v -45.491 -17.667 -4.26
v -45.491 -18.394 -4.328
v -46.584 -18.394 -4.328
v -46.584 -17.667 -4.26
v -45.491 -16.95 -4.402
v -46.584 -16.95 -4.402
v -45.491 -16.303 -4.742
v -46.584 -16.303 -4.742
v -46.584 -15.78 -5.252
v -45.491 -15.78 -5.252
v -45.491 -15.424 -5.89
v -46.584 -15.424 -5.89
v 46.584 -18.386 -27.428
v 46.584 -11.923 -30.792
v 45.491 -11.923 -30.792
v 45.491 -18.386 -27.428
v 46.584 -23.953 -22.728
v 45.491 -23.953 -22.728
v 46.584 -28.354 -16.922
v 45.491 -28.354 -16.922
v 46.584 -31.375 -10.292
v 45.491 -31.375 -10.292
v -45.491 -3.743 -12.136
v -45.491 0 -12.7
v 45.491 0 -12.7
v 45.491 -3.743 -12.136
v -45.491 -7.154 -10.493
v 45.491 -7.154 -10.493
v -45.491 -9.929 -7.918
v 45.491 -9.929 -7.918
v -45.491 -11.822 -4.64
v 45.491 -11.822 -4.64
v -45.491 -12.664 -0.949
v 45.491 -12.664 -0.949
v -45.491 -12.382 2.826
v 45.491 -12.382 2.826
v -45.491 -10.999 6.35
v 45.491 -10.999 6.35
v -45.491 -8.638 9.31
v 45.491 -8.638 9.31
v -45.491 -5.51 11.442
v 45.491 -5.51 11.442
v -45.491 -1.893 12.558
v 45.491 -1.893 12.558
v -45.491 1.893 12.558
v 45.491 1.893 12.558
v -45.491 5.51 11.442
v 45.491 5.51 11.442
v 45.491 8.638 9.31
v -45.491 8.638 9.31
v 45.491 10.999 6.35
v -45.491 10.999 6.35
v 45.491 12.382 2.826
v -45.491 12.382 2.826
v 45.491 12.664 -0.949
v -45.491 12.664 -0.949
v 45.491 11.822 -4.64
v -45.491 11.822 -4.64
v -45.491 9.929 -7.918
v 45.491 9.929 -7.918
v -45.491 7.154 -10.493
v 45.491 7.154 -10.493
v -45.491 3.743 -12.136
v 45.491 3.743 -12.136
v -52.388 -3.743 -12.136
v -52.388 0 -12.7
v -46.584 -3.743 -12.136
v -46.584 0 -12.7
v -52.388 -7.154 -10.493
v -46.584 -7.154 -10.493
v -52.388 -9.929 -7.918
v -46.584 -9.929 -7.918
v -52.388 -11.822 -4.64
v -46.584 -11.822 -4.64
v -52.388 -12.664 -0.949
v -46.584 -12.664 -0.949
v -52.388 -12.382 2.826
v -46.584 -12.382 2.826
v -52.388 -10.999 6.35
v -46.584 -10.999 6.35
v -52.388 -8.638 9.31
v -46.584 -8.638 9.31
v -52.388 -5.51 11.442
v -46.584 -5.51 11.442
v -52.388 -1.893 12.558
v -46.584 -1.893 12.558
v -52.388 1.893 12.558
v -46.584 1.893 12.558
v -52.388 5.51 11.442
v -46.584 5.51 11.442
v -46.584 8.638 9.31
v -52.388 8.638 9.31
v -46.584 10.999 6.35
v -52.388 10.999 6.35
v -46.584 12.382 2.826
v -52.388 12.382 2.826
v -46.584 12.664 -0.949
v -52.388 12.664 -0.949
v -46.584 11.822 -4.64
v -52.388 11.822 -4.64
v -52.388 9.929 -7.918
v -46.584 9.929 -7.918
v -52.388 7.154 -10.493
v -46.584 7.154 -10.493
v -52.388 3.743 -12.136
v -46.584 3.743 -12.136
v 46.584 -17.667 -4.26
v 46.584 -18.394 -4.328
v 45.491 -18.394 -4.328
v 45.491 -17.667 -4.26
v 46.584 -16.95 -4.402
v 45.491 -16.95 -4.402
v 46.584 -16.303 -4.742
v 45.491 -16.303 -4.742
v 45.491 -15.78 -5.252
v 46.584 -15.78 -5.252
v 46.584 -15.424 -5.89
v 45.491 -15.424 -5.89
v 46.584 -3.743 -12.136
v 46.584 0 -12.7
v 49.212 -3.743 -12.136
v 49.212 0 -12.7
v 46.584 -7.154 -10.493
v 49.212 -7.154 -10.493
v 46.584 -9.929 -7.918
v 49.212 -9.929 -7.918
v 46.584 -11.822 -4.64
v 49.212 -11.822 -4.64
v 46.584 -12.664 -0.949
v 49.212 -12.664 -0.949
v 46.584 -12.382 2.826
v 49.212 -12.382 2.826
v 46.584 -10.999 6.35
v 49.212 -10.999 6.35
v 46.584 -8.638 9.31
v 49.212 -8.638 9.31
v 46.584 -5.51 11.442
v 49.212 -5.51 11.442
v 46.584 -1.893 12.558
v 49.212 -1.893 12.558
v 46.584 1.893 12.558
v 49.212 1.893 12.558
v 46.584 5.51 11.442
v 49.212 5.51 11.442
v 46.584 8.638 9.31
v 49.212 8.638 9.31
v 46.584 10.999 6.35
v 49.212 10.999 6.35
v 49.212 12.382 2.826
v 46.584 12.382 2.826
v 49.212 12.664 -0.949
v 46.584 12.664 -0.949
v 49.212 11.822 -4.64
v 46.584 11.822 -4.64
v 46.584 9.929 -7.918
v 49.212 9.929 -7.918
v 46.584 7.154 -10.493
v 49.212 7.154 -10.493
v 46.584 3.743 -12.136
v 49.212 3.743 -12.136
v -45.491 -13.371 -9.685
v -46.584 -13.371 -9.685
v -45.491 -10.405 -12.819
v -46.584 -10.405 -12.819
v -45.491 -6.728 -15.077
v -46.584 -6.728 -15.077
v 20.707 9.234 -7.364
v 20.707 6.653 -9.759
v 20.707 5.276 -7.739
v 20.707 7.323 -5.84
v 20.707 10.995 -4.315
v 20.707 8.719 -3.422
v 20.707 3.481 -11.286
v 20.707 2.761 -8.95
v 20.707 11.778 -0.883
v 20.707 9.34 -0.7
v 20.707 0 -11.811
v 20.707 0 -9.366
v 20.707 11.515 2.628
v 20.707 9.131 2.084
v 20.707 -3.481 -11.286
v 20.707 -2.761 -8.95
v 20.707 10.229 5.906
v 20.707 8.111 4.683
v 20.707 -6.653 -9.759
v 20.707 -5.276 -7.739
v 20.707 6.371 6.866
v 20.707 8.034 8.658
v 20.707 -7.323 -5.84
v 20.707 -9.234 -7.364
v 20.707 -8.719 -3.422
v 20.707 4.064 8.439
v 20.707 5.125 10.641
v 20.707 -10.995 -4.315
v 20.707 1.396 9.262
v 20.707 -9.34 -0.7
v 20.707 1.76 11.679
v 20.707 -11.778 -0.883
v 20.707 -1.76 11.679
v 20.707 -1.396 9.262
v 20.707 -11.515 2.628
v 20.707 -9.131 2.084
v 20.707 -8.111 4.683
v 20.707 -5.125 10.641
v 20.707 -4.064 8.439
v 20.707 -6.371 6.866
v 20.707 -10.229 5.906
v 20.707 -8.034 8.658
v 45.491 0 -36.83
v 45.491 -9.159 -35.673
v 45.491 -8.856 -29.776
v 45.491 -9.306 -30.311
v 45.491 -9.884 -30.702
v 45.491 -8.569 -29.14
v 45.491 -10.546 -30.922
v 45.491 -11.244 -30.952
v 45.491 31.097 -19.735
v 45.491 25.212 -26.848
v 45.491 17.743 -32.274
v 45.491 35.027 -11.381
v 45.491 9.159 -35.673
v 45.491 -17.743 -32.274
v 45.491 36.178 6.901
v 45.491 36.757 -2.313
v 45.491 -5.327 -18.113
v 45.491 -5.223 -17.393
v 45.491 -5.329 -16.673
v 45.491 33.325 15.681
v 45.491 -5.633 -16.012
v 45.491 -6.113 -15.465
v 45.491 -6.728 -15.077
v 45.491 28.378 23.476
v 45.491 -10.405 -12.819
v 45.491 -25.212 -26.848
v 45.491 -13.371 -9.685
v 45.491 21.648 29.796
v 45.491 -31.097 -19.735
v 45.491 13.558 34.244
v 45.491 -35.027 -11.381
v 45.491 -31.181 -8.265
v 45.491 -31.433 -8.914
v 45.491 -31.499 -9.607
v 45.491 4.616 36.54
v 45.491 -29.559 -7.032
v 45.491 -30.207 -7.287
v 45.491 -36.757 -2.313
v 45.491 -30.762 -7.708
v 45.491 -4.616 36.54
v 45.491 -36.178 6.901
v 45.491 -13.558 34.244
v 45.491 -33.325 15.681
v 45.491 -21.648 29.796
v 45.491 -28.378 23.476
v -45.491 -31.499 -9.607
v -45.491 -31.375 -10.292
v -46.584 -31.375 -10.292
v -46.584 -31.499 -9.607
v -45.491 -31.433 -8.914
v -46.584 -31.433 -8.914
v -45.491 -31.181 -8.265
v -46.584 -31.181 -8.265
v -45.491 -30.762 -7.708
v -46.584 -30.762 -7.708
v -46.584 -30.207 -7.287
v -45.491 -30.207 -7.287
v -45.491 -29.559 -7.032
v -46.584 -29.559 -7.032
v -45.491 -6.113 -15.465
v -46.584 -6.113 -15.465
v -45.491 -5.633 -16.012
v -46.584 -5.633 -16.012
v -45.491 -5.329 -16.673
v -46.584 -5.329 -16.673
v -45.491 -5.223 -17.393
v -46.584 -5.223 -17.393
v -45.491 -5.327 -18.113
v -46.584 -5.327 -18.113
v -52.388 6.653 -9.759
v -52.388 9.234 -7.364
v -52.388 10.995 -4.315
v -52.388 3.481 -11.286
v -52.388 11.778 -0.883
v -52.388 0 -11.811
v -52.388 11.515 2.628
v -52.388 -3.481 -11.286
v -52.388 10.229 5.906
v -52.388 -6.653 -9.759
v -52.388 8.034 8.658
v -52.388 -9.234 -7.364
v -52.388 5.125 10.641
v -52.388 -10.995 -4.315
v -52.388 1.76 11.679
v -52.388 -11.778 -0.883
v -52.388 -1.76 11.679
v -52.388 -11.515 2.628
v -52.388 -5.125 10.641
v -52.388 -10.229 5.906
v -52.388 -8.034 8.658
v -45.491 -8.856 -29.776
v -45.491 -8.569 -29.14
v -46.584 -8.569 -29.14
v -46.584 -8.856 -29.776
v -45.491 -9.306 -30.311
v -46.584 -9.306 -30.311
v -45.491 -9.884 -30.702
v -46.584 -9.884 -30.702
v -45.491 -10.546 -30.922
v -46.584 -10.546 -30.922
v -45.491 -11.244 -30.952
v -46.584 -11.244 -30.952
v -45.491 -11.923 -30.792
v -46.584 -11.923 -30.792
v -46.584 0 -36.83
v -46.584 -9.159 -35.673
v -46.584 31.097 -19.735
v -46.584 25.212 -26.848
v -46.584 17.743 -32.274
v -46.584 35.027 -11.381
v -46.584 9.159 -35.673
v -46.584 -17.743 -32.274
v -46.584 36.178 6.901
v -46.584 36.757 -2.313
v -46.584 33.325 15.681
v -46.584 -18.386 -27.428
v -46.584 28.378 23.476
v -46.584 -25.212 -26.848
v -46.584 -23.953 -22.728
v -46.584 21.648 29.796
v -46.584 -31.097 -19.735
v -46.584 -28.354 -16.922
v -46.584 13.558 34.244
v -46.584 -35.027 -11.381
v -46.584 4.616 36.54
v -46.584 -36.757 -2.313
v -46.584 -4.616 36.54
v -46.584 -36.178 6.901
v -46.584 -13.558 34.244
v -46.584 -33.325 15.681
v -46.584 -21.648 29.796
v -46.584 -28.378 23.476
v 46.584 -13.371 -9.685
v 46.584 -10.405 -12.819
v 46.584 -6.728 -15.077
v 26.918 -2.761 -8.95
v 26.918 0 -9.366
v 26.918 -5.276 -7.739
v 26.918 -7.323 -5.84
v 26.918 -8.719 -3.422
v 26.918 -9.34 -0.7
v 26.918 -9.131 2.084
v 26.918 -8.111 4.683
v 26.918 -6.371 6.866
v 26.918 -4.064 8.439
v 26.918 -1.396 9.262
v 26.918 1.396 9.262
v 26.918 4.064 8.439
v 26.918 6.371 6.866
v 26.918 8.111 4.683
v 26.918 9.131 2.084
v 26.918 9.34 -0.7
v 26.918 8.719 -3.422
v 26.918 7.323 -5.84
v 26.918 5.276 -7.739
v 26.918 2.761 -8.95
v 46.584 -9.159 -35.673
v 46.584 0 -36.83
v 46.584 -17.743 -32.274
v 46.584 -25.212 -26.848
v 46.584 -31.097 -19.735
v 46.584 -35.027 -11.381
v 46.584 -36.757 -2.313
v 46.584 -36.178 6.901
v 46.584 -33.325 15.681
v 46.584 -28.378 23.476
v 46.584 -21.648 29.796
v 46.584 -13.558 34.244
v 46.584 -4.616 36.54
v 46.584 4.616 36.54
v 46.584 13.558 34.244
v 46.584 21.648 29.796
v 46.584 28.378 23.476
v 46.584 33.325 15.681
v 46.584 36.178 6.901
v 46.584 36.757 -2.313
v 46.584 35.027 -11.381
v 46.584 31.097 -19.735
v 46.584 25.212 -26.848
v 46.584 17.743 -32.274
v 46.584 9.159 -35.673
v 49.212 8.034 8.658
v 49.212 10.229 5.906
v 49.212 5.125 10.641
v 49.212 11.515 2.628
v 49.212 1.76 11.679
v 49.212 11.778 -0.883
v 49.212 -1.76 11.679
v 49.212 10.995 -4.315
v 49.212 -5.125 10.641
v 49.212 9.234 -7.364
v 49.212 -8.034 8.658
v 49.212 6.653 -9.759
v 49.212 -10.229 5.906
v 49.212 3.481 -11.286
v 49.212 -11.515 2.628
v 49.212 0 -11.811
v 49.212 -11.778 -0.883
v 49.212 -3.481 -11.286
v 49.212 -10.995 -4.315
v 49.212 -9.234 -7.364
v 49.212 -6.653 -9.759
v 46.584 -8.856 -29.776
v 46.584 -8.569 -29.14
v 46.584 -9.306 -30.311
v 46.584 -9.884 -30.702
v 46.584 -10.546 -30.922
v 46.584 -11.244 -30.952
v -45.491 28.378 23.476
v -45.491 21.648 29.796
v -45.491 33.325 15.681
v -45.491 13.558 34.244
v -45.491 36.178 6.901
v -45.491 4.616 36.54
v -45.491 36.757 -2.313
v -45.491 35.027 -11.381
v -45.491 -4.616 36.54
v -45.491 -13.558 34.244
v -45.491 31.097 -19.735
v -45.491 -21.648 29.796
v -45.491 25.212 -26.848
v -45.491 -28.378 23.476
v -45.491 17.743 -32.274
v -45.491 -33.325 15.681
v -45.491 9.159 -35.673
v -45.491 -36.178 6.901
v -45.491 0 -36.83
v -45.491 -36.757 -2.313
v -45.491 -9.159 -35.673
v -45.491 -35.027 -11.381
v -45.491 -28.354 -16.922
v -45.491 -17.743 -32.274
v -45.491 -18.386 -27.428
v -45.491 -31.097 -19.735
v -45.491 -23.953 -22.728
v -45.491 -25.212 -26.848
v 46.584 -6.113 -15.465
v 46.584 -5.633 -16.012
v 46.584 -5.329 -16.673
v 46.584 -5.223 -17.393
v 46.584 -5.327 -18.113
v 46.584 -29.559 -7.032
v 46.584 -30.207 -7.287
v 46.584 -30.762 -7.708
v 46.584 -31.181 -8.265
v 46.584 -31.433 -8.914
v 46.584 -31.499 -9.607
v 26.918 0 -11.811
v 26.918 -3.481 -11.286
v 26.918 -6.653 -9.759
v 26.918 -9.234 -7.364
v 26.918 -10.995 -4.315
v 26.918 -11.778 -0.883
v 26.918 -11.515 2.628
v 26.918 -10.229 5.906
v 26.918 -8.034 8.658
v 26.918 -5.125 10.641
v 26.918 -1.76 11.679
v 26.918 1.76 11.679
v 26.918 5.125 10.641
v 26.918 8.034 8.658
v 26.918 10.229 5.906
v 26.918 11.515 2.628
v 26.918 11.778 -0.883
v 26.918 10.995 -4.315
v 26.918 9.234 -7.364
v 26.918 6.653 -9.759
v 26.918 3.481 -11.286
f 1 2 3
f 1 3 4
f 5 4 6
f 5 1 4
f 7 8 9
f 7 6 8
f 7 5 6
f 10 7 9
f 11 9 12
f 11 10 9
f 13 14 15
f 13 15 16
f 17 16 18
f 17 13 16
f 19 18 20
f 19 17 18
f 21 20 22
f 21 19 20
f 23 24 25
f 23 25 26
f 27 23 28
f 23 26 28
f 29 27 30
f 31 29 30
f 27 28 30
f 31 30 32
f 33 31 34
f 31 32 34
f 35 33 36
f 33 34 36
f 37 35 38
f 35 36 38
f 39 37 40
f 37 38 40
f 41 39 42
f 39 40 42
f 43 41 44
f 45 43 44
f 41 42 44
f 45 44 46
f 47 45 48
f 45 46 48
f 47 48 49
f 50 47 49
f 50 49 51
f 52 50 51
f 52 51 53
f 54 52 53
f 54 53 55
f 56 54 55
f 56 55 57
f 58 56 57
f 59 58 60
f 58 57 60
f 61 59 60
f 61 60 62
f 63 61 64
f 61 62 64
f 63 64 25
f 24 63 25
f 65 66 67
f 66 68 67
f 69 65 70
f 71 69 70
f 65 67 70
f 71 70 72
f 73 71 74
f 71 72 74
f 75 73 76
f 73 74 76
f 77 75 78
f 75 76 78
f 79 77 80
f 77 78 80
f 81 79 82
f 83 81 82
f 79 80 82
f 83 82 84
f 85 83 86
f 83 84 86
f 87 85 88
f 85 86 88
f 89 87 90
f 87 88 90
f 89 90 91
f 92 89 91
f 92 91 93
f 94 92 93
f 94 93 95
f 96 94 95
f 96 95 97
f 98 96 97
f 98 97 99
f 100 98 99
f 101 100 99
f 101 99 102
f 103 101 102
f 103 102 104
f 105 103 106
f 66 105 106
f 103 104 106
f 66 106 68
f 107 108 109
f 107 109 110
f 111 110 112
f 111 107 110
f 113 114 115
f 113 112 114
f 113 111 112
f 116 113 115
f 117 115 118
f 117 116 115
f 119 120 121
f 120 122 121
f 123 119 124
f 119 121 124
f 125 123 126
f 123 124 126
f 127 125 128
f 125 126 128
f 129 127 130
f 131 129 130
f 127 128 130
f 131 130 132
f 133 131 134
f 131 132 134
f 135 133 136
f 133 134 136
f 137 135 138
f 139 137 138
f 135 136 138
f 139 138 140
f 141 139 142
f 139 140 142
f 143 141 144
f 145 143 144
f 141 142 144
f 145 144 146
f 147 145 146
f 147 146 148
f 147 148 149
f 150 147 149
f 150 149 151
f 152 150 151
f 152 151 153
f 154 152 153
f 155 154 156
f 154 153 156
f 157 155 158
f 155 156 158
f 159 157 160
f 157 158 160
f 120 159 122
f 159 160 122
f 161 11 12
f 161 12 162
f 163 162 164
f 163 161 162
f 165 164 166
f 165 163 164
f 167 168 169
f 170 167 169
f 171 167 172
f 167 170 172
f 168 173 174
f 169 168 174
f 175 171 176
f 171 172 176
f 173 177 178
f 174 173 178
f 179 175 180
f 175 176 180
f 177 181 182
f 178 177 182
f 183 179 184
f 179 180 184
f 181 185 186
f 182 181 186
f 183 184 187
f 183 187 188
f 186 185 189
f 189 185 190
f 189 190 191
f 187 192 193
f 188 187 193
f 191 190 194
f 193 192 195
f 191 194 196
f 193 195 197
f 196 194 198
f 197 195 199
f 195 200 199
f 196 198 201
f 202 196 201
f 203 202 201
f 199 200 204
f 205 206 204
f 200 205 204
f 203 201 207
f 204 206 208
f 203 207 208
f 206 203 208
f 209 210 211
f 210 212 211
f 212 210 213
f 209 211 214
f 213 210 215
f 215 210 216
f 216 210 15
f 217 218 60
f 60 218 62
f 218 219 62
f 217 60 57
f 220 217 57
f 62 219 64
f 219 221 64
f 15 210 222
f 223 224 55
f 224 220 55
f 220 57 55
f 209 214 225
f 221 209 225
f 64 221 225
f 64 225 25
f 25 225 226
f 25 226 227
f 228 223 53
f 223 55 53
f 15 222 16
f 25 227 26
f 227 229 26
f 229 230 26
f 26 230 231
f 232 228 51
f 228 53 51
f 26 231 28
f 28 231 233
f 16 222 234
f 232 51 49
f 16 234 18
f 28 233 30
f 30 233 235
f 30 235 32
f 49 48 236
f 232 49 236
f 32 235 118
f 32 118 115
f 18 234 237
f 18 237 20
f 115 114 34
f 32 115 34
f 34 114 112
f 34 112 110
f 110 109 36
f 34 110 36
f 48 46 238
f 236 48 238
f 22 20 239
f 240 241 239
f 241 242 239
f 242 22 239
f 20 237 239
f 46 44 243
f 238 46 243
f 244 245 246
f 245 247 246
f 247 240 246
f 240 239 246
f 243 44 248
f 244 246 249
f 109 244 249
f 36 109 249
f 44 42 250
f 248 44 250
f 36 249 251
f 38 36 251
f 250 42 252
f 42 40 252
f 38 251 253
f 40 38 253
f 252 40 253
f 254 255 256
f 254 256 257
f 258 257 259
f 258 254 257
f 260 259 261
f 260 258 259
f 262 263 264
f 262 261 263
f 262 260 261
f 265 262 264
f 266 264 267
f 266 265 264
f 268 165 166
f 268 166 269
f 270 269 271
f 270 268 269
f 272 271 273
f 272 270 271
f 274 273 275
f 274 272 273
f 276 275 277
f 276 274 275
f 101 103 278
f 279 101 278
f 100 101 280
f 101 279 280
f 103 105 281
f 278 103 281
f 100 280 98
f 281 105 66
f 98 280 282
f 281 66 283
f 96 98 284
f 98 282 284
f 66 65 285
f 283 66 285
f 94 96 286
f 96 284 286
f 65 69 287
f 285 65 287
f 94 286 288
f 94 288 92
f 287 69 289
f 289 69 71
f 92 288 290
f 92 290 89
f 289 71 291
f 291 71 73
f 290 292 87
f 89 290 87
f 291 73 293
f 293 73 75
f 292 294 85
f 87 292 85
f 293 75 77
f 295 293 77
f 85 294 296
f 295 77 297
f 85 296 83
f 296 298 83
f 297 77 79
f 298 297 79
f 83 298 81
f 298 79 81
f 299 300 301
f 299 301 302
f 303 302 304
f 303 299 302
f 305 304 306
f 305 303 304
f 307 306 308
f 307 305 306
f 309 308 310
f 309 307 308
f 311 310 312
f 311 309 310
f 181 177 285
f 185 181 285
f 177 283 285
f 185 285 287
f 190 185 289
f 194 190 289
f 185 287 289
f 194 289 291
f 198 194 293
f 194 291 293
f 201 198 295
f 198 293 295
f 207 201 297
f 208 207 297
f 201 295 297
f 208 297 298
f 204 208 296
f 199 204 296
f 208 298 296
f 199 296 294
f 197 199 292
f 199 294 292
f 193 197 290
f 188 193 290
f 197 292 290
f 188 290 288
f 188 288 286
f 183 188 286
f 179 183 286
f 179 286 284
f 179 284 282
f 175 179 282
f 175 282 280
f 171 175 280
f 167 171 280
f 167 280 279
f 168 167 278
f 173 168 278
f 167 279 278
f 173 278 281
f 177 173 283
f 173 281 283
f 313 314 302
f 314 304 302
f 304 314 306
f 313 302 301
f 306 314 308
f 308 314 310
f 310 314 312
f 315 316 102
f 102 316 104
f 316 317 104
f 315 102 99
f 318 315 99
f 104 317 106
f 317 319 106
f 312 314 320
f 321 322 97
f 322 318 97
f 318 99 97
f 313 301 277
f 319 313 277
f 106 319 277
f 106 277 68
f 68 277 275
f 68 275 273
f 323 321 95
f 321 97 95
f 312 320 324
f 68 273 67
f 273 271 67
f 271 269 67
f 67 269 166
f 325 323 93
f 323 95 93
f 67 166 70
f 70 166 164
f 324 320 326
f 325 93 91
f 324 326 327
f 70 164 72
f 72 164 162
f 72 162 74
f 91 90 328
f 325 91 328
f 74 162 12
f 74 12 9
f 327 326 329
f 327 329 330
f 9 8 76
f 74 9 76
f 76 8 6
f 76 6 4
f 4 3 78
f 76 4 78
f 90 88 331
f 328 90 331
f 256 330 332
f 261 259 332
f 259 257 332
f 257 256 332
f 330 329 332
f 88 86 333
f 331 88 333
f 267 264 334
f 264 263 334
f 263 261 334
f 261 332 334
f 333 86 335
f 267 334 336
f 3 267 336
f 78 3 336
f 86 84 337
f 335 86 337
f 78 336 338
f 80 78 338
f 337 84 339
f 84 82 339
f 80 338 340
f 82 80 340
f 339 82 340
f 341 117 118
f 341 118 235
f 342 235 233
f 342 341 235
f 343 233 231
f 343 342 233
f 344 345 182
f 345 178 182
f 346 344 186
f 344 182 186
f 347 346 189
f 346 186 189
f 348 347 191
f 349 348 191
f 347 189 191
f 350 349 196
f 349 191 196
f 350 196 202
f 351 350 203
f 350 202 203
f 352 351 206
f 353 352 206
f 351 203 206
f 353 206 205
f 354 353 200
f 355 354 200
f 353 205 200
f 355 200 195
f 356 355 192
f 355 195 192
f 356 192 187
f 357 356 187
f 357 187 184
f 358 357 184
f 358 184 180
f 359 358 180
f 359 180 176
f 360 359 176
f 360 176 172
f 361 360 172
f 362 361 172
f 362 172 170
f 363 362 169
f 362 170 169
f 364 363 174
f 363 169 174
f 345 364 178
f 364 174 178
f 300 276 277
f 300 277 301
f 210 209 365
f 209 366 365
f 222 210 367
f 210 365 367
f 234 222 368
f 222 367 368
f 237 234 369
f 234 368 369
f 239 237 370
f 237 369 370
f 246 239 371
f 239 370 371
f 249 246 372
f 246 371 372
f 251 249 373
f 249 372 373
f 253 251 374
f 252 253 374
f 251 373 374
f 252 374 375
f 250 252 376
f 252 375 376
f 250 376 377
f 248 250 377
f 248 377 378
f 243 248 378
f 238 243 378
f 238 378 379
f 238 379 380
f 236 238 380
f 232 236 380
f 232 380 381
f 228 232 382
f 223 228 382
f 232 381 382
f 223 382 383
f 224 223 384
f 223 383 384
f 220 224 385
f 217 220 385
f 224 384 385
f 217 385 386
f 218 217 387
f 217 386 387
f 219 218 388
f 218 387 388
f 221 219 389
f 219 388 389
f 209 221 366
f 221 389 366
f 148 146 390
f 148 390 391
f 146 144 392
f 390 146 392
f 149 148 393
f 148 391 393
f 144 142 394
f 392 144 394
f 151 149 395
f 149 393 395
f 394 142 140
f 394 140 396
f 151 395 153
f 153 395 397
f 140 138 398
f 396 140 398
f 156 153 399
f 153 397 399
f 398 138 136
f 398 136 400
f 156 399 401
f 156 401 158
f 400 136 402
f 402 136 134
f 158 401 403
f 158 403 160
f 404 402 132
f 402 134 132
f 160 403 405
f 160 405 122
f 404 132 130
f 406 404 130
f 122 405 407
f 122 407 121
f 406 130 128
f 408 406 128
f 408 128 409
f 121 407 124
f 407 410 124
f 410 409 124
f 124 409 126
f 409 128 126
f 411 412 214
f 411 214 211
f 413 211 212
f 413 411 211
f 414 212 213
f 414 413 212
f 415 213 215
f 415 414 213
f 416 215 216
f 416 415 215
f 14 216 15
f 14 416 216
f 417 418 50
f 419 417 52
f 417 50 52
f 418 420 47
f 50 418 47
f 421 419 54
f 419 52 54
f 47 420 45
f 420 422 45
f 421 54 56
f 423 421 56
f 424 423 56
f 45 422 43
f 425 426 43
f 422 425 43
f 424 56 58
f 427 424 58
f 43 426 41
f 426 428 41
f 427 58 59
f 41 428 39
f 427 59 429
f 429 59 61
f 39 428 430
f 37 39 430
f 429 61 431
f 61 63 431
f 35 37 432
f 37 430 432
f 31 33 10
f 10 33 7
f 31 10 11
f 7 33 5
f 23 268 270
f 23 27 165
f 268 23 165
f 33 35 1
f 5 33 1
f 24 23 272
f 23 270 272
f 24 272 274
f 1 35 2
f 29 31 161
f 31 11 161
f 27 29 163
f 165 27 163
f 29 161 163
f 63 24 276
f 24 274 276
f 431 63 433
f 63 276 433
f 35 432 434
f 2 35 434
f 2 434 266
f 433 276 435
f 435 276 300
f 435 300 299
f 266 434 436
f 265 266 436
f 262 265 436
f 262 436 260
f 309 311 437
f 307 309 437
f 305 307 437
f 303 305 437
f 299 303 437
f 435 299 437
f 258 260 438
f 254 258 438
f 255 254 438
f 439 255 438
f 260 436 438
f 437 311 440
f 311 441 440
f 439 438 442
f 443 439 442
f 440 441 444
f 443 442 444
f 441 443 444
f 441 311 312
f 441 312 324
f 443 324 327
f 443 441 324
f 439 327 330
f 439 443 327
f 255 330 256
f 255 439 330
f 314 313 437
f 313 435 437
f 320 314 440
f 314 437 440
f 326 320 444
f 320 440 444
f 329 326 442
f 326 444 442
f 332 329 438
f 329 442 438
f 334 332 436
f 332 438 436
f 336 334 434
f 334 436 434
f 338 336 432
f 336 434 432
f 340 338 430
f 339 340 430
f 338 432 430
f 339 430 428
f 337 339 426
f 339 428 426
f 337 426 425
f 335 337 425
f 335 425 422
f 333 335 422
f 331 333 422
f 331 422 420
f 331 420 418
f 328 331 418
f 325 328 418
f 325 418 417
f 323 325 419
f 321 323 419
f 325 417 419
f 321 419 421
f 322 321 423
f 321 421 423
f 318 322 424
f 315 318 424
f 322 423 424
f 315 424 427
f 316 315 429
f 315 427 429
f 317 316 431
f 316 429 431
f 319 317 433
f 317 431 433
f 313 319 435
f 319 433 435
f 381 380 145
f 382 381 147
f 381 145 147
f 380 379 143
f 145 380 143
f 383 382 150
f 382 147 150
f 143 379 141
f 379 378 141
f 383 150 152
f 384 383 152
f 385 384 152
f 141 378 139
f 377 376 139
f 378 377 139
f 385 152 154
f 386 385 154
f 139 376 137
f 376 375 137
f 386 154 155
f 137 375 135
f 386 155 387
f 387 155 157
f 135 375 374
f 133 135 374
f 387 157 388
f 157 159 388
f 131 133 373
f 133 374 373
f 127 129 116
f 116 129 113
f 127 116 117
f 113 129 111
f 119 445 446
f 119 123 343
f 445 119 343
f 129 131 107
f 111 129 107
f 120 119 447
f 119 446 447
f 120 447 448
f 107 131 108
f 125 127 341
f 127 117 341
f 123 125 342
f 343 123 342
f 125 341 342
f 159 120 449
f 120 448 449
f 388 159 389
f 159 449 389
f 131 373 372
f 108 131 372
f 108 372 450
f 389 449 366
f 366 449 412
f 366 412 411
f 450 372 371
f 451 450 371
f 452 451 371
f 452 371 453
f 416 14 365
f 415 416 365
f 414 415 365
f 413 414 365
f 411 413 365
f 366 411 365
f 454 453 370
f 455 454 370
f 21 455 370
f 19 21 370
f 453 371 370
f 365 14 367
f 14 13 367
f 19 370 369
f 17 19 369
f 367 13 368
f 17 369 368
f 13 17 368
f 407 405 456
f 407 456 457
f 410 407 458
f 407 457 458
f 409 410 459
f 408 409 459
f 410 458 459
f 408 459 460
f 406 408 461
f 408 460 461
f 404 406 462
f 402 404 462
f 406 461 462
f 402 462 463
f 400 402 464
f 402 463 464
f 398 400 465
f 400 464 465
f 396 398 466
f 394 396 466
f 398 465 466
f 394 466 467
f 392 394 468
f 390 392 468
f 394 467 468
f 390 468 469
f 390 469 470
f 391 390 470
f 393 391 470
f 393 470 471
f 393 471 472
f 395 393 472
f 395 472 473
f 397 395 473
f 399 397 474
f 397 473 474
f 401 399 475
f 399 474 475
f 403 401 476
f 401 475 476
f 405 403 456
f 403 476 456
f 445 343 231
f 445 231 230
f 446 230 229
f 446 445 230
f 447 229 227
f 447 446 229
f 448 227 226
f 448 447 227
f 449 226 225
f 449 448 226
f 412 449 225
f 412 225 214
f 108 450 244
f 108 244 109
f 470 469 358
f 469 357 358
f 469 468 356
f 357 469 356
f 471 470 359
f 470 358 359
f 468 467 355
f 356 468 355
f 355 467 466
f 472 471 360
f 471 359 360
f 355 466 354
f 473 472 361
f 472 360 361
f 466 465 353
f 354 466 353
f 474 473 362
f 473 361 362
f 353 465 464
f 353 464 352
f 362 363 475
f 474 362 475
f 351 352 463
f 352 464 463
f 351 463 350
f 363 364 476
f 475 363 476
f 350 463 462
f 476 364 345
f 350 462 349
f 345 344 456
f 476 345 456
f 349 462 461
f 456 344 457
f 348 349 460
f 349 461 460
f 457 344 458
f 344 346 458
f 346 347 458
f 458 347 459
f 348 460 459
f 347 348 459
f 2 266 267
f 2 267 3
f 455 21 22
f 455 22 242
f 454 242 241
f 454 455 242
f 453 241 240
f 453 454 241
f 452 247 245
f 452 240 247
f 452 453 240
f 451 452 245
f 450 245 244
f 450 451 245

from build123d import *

# Parameters (mm, degrees)
CUT_EXTRUDE1_DEPTH      = 111.87459973
CUT_EXTRUDE1_DEPTH_BACK = 111.87459973


with BuildPart() as part:
    # Sketch2 → Revolve1 (revolve)
    with BuildSketch(Plane.XY):
        Polygon((-52.3875, 11.811), (-52.3875, 12.7), (-46.5836, 12.7), (-46.5836, 36.83), (-45.4914, 36.83), (-45.4914, 12.7), (45.4914, 12.7), (45.4914, 36.83), (46.5836, 36.83), (46.5836, 12.7), (49.2125, 12.7), (49.2125, 11.811), (26.91765, 11.811), (26.91765, 9.36625), (20.70735, 9.36625), (20.70735, 11.811), align=None)
    revolve(axis=Axis((0, 0, 0), (-1, 0, 0)))

    # Sketch3 → Cut-Extrude1 (cut, two sides: drawn at the far end of the back side and taken through both)
    with BuildSketch(Plane.ZY.offset(-45.4914).offset(-CUT_EXTRUDE1_DEPTH_BACK)):
        with BuildLine():
            Line((-18.112952688, -5.32652278), (-29.140106204, -8.569306297))
            ThreePointArc((-29.140106204, -8.569306297), (-30.702095808, -9.883795088), (-30.792130213, -11.923301428))
            ThreePointArc((-30.792130213, -11.923301428), (-22.728159534, -23.953103435), (-10.291997319, -31.375072768))
            ThreePointArc((-10.291997319, -31.375072768), (-8.264508496, -31.180706004), (-7.031658144, -29.559419671))
            Line((-7.031658144, -29.559419671), (-4.327850892, -18.394165222))
            ThreePointArc((-4.327850892, -18.394165222), (-4.548475673, -16.613982469), (-5.890298237, -15.423504358))
            ThreePointArc((-5.890298237, -15.423504358), (-11.349323888, -11.990535738), (-15.076837789, -6.728228762))
            ThreePointArc((-15.076837789, -6.728228762), (-16.331679174, -5.457246069), (-18.112952688, -5.32652278))
        make_face()
    extrude(amount=CUT_EXTRUDE1_DEPTH + CUT_EXTRUDE1_DEPTH_BACK, mode=Mode.SUBTRACT)


solid = part.part
